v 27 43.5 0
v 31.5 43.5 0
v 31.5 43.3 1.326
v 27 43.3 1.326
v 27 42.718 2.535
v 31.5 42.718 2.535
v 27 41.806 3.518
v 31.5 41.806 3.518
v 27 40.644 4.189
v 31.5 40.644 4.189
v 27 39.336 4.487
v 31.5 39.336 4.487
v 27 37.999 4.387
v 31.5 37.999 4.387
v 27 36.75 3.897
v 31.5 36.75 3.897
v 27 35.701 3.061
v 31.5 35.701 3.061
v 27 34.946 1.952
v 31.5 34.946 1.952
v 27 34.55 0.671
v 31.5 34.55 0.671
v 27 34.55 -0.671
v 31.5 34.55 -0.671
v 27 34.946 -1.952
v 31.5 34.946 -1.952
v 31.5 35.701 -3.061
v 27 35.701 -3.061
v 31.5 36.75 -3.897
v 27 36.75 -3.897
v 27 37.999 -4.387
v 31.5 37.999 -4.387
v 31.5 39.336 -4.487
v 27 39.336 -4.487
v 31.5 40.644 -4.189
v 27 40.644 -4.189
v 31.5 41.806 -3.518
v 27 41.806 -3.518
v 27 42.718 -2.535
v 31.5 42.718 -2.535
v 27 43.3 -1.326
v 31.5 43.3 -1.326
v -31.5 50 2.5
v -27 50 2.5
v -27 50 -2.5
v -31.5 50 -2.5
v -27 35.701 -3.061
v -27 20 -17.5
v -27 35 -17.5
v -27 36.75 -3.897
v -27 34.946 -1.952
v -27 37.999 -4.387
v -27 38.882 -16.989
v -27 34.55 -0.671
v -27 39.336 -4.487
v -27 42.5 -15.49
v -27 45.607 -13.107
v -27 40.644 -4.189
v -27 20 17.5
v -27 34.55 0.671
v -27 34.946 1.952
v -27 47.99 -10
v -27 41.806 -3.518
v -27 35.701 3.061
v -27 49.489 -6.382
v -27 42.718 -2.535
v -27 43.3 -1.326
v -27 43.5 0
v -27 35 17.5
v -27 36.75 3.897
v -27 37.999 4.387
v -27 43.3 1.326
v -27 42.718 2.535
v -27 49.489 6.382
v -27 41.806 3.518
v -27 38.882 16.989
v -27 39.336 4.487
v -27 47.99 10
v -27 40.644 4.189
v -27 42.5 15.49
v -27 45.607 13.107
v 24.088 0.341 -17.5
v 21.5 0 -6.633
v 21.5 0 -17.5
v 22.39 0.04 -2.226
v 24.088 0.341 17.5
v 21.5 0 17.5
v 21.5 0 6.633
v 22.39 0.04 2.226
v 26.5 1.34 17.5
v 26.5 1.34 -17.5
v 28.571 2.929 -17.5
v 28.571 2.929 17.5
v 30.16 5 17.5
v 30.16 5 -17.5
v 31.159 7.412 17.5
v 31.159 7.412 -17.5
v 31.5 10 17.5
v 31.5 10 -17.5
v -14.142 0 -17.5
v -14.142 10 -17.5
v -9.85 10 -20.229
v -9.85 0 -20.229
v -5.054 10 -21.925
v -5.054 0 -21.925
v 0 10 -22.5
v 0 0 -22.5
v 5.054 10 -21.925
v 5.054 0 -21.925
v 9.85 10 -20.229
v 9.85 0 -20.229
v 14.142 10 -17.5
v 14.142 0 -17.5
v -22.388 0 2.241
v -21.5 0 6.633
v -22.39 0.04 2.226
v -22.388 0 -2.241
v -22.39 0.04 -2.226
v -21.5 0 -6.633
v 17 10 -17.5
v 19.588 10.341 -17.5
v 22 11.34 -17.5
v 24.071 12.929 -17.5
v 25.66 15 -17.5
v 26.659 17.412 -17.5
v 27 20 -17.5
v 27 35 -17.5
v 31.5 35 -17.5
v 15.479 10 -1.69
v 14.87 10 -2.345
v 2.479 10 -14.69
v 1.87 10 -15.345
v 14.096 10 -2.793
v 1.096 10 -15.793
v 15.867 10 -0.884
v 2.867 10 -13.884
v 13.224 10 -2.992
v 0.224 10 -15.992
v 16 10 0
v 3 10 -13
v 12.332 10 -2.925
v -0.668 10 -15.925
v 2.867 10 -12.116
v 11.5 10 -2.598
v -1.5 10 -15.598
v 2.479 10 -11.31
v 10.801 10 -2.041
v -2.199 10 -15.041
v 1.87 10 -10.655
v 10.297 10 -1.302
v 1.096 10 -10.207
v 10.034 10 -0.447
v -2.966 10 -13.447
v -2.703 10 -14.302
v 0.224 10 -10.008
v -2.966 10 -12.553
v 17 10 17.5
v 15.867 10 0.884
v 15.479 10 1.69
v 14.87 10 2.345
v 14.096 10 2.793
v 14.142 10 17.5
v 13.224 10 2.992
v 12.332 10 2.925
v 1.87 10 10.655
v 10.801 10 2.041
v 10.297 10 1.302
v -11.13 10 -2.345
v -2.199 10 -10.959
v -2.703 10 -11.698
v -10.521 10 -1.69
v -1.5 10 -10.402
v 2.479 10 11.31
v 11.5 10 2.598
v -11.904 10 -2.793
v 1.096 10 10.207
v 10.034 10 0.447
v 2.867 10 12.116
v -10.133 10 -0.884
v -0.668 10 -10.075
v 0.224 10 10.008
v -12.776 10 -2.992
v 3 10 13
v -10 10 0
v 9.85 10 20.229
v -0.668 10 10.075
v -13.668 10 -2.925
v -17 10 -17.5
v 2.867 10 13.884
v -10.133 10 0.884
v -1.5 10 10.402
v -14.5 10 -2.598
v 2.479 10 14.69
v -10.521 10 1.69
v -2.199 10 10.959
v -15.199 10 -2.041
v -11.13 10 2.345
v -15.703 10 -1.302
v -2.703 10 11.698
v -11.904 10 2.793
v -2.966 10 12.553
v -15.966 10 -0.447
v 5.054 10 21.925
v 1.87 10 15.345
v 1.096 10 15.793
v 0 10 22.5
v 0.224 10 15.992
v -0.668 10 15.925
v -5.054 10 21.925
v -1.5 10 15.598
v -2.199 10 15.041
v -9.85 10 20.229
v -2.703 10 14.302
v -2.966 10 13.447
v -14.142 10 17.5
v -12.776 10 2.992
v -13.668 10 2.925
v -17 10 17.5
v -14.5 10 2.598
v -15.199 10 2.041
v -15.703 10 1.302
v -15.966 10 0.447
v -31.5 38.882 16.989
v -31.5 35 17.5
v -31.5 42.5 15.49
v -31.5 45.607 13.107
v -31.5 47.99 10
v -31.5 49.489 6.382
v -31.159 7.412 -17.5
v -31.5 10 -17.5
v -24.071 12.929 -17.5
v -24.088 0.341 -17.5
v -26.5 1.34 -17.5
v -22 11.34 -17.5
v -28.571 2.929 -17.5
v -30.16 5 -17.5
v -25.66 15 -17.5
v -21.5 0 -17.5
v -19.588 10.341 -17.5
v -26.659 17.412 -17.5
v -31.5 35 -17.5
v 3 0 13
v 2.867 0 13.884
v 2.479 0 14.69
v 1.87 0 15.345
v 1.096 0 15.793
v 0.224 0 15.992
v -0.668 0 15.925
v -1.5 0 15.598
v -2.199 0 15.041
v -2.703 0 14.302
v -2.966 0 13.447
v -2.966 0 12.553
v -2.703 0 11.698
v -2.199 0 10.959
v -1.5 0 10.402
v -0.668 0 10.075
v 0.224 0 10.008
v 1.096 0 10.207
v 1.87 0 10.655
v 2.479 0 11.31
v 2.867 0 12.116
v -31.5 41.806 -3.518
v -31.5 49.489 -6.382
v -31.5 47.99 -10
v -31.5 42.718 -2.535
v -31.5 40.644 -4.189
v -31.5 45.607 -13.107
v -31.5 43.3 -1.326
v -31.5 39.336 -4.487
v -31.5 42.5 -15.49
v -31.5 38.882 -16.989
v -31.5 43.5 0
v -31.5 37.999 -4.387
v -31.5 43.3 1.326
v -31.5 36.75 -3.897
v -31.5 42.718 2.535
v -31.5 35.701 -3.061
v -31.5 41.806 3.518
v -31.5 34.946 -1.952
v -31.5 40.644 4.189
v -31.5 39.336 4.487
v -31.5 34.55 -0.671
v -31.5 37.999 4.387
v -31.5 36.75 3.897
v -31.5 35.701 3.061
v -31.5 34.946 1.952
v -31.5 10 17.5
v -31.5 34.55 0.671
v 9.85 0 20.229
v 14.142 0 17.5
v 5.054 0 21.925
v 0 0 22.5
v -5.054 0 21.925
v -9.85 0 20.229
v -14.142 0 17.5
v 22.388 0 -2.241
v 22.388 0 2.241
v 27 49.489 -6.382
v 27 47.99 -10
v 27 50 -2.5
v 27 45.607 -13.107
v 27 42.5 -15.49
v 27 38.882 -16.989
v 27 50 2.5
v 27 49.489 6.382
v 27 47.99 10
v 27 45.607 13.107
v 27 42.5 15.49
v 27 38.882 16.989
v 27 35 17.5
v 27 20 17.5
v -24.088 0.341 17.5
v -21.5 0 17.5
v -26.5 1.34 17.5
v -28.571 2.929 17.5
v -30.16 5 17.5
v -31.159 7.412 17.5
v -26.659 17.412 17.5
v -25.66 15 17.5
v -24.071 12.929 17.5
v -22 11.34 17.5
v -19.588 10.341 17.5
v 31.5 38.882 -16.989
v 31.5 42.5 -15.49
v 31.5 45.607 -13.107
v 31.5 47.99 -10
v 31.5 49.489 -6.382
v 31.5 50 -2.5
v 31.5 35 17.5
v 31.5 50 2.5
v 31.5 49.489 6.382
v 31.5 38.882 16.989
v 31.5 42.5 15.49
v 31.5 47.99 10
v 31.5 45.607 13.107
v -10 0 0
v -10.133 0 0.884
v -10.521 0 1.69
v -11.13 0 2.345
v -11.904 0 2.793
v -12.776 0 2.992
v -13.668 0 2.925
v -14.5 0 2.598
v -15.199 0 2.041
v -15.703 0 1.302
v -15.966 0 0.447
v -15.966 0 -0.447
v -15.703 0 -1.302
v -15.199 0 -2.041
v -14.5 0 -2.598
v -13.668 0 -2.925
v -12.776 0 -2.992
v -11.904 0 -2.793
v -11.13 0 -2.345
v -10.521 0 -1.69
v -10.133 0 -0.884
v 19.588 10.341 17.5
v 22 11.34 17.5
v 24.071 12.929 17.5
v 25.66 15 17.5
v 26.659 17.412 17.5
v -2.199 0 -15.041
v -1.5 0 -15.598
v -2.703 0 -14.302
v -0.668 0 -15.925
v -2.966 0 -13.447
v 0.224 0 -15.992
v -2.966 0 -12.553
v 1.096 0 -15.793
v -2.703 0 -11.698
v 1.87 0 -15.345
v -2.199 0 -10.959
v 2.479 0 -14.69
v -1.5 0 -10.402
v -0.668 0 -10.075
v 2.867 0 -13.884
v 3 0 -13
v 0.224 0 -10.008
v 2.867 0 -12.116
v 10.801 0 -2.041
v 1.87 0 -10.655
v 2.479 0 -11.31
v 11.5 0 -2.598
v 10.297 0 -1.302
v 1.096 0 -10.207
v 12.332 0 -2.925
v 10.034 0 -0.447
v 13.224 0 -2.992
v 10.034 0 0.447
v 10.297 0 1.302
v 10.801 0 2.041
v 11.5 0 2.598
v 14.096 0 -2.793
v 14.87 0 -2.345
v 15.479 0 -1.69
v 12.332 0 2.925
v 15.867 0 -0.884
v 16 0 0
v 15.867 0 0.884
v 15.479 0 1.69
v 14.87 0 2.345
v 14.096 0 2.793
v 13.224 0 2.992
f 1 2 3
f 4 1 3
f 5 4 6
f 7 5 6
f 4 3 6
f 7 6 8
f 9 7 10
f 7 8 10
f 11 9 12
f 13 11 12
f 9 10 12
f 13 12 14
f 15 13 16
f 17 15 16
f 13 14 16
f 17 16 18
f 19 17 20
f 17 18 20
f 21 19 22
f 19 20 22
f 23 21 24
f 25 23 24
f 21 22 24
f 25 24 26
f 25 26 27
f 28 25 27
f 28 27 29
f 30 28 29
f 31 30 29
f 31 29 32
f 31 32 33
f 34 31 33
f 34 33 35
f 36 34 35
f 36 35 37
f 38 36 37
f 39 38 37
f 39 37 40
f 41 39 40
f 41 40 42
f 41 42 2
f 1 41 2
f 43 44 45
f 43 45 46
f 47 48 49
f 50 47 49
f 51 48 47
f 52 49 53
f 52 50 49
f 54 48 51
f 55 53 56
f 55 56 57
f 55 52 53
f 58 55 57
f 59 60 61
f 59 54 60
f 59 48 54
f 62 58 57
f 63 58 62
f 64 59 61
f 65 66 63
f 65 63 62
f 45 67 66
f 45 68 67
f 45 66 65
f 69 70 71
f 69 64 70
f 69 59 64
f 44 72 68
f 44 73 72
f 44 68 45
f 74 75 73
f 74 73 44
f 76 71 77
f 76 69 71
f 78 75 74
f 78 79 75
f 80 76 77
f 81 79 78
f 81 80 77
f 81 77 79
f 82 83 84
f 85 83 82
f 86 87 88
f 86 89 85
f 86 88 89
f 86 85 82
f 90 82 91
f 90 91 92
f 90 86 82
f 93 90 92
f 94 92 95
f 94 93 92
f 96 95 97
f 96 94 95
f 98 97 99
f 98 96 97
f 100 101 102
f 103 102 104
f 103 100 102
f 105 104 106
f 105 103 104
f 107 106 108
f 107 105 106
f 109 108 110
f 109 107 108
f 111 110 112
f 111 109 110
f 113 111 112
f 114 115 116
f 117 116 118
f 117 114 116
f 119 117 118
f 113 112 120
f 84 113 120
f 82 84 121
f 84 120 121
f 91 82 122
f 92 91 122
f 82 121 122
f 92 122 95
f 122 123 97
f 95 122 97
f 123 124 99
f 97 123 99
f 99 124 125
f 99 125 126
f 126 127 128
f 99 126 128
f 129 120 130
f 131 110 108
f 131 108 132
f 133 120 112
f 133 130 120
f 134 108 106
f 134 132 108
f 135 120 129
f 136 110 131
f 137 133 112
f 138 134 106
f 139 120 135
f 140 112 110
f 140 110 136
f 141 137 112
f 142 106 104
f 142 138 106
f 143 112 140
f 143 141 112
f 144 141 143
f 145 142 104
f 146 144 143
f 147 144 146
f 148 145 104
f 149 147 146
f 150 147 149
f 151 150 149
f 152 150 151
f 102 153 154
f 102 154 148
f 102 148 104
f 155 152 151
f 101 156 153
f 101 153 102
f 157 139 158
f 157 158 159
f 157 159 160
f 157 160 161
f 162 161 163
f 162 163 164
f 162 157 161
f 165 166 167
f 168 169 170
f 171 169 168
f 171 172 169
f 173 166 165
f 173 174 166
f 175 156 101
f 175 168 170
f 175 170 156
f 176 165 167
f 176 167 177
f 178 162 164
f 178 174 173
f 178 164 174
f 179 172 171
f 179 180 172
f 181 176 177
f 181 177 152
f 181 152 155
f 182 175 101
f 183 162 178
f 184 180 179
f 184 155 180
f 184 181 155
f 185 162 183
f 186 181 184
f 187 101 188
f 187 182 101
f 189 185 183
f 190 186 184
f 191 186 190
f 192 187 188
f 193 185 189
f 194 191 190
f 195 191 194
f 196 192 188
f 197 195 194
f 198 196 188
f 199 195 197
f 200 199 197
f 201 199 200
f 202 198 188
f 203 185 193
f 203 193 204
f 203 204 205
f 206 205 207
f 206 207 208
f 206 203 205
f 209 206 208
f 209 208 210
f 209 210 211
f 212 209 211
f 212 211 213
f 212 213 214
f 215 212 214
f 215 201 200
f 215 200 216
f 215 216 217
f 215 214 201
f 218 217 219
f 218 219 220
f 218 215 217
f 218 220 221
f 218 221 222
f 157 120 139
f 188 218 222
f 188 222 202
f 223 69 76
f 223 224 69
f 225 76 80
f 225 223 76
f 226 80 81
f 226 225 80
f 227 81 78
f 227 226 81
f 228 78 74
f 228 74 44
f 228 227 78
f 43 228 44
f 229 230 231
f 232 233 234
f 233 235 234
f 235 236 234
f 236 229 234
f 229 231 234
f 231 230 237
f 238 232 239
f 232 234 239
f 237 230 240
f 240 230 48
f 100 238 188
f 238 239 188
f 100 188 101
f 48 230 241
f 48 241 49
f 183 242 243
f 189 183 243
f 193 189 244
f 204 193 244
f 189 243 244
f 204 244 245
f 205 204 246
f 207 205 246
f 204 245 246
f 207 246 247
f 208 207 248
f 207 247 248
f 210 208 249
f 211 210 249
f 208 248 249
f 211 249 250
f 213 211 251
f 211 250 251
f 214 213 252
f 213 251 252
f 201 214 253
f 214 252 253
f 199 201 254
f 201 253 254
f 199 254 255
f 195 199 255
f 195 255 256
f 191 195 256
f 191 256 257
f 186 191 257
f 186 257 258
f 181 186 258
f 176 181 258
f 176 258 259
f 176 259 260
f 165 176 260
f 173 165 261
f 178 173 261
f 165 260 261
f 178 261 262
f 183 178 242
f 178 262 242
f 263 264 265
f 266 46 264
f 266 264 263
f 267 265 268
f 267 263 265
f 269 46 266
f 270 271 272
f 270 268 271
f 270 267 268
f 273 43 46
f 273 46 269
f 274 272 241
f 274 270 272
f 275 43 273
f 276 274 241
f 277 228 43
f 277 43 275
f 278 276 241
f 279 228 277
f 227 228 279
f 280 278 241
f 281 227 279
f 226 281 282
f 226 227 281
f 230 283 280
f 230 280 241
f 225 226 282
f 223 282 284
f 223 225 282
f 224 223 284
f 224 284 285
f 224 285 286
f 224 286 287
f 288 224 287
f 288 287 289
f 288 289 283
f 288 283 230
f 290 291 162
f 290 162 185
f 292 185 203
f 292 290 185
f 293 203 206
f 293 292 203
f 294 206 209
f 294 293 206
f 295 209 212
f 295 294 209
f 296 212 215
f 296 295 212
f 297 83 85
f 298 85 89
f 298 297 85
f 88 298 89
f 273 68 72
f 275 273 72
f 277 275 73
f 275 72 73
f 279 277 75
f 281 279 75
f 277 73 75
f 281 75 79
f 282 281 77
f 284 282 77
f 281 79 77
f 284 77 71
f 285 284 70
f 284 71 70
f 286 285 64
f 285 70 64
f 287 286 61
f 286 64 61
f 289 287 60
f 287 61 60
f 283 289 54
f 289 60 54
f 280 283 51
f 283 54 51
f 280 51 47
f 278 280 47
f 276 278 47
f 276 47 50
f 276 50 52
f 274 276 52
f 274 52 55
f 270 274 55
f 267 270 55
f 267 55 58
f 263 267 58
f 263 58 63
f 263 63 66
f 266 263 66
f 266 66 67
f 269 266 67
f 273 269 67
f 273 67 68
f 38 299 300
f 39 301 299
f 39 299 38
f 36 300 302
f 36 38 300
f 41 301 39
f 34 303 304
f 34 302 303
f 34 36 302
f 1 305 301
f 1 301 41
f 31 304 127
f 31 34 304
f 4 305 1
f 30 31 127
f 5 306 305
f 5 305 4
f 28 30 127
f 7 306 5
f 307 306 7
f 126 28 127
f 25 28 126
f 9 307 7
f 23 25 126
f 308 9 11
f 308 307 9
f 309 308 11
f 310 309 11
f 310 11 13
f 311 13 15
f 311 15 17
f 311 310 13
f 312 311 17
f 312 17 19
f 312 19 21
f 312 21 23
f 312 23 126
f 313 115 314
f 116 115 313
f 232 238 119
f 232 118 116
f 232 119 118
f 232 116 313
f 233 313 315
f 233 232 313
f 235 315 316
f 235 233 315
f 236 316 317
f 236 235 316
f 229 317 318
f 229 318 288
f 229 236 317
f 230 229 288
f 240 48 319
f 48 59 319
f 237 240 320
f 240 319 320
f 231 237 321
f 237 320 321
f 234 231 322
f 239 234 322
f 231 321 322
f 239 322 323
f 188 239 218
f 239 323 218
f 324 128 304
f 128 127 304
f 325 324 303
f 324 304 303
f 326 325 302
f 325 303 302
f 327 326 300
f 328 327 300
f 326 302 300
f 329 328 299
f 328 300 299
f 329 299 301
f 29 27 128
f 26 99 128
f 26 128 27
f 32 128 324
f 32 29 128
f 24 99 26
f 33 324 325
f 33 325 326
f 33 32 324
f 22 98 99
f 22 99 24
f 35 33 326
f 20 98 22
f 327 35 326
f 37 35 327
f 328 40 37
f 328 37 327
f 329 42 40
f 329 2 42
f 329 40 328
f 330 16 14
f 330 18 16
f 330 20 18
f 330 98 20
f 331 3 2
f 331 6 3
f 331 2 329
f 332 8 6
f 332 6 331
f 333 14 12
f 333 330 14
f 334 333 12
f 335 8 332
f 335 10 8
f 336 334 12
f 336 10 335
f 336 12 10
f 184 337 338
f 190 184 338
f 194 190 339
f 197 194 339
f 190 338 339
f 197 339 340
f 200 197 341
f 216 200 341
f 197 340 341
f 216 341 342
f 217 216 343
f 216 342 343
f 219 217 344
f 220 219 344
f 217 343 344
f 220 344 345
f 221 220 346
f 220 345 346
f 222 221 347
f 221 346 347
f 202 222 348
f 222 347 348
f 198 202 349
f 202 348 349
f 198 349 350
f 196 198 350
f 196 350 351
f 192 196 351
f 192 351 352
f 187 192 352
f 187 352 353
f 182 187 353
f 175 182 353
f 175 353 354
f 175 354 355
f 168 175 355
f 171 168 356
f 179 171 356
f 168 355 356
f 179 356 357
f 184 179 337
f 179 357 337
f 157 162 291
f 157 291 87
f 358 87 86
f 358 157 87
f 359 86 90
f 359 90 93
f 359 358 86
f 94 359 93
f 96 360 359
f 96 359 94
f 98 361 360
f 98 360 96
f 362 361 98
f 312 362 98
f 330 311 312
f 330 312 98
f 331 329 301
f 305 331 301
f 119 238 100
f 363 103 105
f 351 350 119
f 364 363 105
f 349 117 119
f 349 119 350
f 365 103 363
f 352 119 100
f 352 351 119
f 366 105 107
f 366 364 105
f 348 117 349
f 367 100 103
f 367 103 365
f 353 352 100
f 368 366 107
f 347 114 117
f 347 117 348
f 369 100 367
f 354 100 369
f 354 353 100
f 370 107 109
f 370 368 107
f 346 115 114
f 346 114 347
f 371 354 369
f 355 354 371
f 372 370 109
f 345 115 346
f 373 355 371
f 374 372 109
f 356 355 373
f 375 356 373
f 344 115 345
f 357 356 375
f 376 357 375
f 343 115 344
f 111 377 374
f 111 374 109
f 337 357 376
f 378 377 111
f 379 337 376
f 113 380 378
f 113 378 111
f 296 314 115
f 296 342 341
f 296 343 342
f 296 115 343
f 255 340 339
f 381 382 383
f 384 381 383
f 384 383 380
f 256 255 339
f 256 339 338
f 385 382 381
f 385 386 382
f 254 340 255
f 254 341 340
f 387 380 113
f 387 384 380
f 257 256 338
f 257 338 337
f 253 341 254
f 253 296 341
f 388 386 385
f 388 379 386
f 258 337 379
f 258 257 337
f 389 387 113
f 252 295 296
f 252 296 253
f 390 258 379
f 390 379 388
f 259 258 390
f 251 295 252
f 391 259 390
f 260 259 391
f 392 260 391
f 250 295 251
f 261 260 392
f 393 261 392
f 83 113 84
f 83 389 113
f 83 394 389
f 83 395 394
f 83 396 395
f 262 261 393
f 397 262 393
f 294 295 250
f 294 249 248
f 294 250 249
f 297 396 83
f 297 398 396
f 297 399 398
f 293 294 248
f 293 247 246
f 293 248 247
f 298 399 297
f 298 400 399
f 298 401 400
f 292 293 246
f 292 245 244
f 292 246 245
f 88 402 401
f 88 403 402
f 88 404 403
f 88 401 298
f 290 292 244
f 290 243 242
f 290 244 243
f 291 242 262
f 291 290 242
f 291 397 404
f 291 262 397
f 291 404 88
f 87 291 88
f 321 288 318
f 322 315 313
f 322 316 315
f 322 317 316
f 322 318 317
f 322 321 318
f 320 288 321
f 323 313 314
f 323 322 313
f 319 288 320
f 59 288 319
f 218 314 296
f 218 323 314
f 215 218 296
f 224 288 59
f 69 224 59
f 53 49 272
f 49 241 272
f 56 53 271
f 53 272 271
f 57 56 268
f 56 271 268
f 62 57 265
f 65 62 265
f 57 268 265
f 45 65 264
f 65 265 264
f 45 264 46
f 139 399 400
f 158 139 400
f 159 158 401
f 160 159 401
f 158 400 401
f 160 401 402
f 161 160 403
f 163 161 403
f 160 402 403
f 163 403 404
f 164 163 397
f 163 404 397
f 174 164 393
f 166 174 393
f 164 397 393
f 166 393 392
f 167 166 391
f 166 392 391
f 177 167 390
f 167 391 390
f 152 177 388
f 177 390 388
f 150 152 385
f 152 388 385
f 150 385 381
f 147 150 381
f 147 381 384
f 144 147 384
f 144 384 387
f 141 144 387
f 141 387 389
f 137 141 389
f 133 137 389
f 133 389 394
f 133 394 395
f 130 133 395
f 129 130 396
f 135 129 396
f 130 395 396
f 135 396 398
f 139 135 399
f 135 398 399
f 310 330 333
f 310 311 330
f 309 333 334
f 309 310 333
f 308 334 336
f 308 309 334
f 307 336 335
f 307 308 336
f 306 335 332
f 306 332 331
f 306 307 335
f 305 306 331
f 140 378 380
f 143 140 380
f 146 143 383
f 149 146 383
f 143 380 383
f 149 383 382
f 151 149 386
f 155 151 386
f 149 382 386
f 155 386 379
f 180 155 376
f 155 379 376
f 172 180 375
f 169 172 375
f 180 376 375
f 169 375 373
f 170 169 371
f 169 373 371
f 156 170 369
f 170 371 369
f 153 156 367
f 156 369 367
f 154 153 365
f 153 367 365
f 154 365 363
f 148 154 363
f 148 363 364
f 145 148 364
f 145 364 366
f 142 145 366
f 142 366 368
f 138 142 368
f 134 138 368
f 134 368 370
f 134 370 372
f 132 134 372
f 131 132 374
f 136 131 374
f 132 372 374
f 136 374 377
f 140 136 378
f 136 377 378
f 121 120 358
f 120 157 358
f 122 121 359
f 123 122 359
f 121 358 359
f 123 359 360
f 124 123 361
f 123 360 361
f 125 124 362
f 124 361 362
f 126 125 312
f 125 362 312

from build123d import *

# Parameters (mm, degrees)
BOSS_EXTRUDE1_DEPTH = 17.5
FILLET3_R           = 10
SKETCH2_R           = 22.5
BOSS_EXTRUDE4_DEPTH = 10
SKETCH4_R           = 3
CUT_EXTRUDE2_DEPTH  = 10
FILLET6_R           = 15
SKETCH6_R           = 4.5
CUT_EXTRUDE3_DEPTH  = 84.517962215


with BuildPart() as part:
    # Sketch1 → Boss-Extrude1 (new, symmetric)
    with BuildSketch(Plane.XY):
        Polygon((-31.5, 0), (31.5, 0), (31.5, 50), (27, 50), (27, 10), (-27, 10), (-27, 50), (-31.5, 50), align=None)
    extrude(amount=BOSS_EXTRUDE1_DEPTH, both=True)

    # Fillet3
    fillet3_edges = [part.edges().sort_by_distance(p)[0] for p in [
        (-27, 10, 0),
        (27, 10, 0),
        (31.5, 0, 0),
        (-31.5, 0, 0),
    ]]
    fillet(fillet3_edges, radius=FILLET3_R)

    # Sketch2 → Boss-Extrude4 (add)
    with BuildSketch(Plane.XZ):
        Circle(SKETCH2_R)
    extrude(amount=-BOSS_EXTRUDE4_DEPTH)

    # Sketch4 → Cut-Extrude2 (cut)
    with BuildSketch(Plane.XZ):
        with Locations((0, 13)):
            Circle(SKETCH4_R)
        with Locations((13, 0)):
            Circle(SKETCH4_R)
        with Locations((0, -13)):
            Circle(SKETCH4_R)
        with Locations((-13, 0)):
            Circle(SKETCH4_R)
    extrude(amount=-CUT_EXTRUDE2_DEPTH, mode=Mode.SUBTRACT)

    # Fillet6
    fillet6_edges = [part.edges().sort_by_distance(p)[0] for p in [
        (29.25, 50, 17.5),
        (29.25, 50, -17.5),
        (-29.25, 50, -17.5),
        (-29.25, 50, 17.5),
    ]]
    fillet(fillet6_edges, radius=FILLET6_R)

    # Sketch6 → Cut-Extrude3 (cut, through all)
    with BuildSketch(Plane(origin=(31.5, 0, 0), x_dir=(0, 0, -1), z_dir=(1, 0, 0))):
        with Locations(Location((0, 39, 0), (0, 0, 90))):
            Circle(SKETCH6_R)
    extrude(amount=-CUT_EXTRUDE3_DEPTH, mode=Mode.SUBTRACT)


solid = part.part
